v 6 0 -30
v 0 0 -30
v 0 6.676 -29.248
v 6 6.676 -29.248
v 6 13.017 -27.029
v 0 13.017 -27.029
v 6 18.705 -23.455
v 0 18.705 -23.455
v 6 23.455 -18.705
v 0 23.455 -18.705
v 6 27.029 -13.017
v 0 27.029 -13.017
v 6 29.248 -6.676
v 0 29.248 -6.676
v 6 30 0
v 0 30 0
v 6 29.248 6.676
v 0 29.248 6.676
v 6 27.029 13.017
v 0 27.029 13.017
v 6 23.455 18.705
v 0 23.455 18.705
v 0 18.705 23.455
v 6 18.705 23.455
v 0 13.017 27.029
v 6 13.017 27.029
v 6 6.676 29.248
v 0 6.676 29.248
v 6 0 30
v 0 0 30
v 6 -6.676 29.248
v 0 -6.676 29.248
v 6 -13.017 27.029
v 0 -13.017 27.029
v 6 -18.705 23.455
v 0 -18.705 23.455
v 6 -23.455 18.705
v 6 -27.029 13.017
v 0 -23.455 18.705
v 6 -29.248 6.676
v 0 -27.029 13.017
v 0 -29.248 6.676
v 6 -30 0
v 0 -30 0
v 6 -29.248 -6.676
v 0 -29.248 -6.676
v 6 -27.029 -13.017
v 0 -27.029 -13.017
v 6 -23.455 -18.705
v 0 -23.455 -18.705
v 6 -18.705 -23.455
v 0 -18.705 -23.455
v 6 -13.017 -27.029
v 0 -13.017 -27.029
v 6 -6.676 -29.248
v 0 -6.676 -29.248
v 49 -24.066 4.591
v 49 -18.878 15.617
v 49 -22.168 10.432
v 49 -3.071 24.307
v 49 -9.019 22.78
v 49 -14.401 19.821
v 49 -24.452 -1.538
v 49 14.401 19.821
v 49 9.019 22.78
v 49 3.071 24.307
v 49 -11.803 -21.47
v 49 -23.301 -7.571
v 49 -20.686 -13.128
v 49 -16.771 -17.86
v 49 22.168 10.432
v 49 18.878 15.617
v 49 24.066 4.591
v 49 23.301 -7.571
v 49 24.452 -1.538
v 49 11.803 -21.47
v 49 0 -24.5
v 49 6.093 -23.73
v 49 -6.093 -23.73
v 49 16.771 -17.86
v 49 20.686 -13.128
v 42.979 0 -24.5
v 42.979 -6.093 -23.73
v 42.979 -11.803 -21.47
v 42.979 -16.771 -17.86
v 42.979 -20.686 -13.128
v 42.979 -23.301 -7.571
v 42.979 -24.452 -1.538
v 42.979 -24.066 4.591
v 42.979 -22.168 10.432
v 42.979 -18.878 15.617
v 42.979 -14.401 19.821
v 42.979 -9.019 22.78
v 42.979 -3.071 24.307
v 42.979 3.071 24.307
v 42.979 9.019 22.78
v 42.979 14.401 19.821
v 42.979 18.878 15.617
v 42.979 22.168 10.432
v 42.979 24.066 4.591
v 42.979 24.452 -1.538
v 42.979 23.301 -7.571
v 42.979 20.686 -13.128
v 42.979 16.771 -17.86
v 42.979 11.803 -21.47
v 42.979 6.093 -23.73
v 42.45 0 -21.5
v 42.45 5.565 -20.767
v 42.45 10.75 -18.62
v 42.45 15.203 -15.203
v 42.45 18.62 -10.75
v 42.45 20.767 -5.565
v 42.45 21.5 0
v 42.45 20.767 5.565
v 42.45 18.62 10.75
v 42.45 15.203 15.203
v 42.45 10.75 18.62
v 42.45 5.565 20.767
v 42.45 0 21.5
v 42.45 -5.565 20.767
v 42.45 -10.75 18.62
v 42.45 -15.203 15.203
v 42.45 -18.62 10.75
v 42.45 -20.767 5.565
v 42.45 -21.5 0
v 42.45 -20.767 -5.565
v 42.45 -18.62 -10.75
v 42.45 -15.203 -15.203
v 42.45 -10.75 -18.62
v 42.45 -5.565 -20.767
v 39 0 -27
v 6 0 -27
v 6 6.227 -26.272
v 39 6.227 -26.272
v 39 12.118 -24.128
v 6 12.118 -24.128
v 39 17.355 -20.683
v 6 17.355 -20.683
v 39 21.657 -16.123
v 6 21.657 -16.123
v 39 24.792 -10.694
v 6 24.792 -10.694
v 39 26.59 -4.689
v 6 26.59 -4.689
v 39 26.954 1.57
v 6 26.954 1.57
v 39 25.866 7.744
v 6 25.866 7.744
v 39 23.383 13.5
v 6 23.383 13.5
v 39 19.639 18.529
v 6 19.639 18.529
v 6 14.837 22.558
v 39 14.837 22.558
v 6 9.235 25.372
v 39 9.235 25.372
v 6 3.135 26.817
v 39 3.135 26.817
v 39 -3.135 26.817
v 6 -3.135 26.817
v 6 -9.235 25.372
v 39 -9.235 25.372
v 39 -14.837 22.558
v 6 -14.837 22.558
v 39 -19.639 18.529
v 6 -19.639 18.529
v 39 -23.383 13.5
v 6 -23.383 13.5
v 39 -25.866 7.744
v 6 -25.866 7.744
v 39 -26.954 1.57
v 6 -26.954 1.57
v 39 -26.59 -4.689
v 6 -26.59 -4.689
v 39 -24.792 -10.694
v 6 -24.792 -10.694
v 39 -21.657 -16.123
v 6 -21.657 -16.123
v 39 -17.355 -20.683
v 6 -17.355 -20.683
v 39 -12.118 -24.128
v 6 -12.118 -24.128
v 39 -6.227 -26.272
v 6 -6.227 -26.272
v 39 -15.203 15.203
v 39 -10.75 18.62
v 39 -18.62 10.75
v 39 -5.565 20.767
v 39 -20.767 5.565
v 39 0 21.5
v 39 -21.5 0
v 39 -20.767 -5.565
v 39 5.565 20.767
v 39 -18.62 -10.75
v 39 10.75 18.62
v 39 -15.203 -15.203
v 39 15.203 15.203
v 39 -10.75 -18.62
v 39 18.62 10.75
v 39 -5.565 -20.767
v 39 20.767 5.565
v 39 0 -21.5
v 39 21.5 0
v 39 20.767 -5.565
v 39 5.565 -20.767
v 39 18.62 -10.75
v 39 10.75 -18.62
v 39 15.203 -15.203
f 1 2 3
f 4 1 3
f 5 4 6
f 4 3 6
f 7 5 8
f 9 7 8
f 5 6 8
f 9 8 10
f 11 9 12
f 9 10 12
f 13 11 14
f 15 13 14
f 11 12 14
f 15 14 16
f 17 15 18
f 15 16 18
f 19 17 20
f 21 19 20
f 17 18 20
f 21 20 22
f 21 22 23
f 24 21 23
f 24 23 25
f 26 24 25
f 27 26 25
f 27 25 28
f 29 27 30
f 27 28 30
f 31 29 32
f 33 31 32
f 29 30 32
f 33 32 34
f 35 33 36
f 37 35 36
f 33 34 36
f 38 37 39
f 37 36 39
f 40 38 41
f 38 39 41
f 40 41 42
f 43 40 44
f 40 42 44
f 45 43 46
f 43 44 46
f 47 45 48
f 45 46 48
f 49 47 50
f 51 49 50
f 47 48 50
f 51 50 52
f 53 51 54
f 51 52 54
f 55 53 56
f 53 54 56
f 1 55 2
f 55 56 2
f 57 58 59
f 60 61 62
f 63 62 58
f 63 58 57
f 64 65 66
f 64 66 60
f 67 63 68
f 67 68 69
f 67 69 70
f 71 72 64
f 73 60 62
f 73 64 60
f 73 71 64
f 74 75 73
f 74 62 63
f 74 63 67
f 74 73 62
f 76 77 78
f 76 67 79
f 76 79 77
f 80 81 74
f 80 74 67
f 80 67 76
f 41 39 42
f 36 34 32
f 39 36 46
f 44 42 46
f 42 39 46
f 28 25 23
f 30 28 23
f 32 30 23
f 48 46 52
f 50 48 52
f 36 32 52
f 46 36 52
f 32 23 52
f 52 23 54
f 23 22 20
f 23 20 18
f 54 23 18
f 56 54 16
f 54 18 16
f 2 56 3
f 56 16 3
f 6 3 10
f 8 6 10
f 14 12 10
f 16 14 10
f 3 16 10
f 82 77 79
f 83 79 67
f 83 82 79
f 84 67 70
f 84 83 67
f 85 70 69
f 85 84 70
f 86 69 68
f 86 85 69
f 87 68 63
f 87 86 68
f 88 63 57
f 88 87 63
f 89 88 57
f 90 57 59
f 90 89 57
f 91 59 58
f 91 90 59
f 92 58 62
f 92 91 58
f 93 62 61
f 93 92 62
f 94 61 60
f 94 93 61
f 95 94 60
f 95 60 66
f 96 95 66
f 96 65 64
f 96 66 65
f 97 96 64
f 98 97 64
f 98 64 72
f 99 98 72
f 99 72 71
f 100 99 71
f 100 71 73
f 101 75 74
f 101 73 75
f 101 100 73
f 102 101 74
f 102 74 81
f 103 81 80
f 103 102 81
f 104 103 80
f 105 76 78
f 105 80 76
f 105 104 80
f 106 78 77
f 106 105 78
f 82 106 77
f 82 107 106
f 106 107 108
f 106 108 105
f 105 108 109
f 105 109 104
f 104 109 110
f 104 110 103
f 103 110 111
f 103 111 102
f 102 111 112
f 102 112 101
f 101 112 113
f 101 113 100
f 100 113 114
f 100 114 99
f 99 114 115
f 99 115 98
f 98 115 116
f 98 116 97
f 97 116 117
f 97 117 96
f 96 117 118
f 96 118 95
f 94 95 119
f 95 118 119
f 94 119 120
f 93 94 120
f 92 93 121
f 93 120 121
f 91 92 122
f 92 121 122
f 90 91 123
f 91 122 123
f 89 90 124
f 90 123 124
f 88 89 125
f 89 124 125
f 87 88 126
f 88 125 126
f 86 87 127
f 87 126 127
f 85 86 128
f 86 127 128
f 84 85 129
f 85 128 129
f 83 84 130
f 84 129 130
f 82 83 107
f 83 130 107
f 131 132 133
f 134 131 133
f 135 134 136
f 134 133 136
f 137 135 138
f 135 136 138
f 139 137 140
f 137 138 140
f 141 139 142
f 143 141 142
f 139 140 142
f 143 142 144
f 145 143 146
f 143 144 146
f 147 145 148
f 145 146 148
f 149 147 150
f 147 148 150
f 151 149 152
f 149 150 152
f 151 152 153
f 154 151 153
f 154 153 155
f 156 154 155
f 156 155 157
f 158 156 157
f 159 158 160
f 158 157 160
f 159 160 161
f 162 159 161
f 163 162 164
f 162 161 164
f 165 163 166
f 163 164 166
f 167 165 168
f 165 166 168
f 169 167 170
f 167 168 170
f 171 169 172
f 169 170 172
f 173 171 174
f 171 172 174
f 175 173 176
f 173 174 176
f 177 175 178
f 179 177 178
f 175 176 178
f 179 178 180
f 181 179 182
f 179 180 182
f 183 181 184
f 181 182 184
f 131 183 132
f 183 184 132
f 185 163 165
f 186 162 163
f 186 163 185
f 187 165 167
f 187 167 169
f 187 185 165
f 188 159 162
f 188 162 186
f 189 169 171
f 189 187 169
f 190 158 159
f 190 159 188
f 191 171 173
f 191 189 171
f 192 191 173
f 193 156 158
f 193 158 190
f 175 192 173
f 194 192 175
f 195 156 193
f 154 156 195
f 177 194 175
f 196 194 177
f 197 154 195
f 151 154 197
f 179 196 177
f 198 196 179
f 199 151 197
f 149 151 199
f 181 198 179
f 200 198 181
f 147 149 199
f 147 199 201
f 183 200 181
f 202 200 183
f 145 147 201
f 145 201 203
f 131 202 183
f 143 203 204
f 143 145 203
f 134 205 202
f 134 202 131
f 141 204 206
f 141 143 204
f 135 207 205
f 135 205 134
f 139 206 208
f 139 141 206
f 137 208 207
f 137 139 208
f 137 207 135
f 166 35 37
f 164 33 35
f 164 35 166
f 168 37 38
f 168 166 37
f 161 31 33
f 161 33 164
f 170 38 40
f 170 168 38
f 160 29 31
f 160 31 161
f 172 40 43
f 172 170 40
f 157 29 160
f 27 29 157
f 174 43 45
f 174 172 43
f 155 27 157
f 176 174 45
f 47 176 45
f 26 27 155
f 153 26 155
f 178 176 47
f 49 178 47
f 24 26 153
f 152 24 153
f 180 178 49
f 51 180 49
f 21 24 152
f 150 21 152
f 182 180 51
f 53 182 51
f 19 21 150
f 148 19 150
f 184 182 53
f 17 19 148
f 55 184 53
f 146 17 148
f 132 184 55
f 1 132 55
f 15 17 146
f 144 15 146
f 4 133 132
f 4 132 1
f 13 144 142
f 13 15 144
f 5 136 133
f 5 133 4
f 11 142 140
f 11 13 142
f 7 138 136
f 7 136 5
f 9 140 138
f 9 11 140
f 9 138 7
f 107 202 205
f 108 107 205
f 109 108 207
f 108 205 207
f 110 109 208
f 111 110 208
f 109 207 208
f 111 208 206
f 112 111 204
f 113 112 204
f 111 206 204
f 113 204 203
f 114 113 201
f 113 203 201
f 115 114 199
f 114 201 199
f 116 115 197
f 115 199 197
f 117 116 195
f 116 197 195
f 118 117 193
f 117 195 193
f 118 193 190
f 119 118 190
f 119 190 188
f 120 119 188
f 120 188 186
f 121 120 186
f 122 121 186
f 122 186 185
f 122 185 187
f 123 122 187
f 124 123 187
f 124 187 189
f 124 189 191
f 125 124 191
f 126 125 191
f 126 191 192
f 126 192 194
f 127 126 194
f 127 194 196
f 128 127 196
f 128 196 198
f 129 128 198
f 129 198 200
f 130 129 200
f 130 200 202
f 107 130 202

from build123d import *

# Parameters (mm, degrees)
SKETCH1_R        = 30
BIGLIP_DEPTH     = 6
SKETCH2_R        = 27
INNERTUBE_DEPTH  = 33
SKETCH3_R        = 21.5
CONNECTION_DEPTH = 4
SKETCH4_R        = 24.5
SMALLLIP_DEPTH   = 6
CHAMFER1_SIZE    = 3.119205001
CHAMFER1_SIZE_2  = 0.55


with BuildPart() as part:
    # Sketch1 → bigLip (new body)
    with BuildSketch(Plane(origin=(0, 0, 0), x_dir=(0, 0, -1), z_dir=(1, 0, 0))):
        Circle(SKETCH1_R)
    extrude(amount=BIGLIP_DEPTH)

    # Sketch2 → innerTube (add)
    with BuildSketch(Plane(origin=(6, 0, 0), x_dir=(0, 0, -1), z_dir=(1, 0, 0))):
        Circle(SKETCH2_R)
    extrude(amount=INNERTUBE_DEPTH)

    # Sketch3 → connection (add)
    with BuildSketch(Plane(origin=(39, 0, 0), x_dir=(0, 0, -1), z_dir=(1, 0, 0))):
        Circle(SKETCH3_R)
    extrude(amount=CONNECTION_DEPTH)

    # Sketch4 → smallLip (add)
    with BuildSketch(Plane(origin=(43, 0, 0), x_dir=(0, 0, -1), z_dir=(1, 0, 0))):
        Circle(SKETCH4_R)
    extrude(amount=SMALLLIP_DEPTH)

    # Chamfer1
    # the kernel refuses this chamfer: 3.119205001, 0.55 mm, written as the material it adds along each edge
    with BuildSketch(Plane(origin=(43, 0, 0), x_dir=(0, 0, -1), z_dir=(0, -1, 0))) as chamfer1_piece_1_section:
        Polygon((21.5 + CHAMFER1_SIZE, 0), (21.5, -CHAMFER1_SIZE_2), (21.5, 0), align=None)
    chamfer1_piece_1 = revolve(axis=Axis((43, 0, 0), (1, 0, 0)), mode=Mode.PRIVATE)
    chamfer1_piece_1 = chamfer1_piece_1 & Plane(origin=(42.756656471, 0, 0), x_dir=(0, 0, -1), z_dir=(-1, 0, 0)) * Cylinder(24.5, 99, mode=Mode.PRIVATE)
    add(chamfer1_piece_1)


solid = part.part
